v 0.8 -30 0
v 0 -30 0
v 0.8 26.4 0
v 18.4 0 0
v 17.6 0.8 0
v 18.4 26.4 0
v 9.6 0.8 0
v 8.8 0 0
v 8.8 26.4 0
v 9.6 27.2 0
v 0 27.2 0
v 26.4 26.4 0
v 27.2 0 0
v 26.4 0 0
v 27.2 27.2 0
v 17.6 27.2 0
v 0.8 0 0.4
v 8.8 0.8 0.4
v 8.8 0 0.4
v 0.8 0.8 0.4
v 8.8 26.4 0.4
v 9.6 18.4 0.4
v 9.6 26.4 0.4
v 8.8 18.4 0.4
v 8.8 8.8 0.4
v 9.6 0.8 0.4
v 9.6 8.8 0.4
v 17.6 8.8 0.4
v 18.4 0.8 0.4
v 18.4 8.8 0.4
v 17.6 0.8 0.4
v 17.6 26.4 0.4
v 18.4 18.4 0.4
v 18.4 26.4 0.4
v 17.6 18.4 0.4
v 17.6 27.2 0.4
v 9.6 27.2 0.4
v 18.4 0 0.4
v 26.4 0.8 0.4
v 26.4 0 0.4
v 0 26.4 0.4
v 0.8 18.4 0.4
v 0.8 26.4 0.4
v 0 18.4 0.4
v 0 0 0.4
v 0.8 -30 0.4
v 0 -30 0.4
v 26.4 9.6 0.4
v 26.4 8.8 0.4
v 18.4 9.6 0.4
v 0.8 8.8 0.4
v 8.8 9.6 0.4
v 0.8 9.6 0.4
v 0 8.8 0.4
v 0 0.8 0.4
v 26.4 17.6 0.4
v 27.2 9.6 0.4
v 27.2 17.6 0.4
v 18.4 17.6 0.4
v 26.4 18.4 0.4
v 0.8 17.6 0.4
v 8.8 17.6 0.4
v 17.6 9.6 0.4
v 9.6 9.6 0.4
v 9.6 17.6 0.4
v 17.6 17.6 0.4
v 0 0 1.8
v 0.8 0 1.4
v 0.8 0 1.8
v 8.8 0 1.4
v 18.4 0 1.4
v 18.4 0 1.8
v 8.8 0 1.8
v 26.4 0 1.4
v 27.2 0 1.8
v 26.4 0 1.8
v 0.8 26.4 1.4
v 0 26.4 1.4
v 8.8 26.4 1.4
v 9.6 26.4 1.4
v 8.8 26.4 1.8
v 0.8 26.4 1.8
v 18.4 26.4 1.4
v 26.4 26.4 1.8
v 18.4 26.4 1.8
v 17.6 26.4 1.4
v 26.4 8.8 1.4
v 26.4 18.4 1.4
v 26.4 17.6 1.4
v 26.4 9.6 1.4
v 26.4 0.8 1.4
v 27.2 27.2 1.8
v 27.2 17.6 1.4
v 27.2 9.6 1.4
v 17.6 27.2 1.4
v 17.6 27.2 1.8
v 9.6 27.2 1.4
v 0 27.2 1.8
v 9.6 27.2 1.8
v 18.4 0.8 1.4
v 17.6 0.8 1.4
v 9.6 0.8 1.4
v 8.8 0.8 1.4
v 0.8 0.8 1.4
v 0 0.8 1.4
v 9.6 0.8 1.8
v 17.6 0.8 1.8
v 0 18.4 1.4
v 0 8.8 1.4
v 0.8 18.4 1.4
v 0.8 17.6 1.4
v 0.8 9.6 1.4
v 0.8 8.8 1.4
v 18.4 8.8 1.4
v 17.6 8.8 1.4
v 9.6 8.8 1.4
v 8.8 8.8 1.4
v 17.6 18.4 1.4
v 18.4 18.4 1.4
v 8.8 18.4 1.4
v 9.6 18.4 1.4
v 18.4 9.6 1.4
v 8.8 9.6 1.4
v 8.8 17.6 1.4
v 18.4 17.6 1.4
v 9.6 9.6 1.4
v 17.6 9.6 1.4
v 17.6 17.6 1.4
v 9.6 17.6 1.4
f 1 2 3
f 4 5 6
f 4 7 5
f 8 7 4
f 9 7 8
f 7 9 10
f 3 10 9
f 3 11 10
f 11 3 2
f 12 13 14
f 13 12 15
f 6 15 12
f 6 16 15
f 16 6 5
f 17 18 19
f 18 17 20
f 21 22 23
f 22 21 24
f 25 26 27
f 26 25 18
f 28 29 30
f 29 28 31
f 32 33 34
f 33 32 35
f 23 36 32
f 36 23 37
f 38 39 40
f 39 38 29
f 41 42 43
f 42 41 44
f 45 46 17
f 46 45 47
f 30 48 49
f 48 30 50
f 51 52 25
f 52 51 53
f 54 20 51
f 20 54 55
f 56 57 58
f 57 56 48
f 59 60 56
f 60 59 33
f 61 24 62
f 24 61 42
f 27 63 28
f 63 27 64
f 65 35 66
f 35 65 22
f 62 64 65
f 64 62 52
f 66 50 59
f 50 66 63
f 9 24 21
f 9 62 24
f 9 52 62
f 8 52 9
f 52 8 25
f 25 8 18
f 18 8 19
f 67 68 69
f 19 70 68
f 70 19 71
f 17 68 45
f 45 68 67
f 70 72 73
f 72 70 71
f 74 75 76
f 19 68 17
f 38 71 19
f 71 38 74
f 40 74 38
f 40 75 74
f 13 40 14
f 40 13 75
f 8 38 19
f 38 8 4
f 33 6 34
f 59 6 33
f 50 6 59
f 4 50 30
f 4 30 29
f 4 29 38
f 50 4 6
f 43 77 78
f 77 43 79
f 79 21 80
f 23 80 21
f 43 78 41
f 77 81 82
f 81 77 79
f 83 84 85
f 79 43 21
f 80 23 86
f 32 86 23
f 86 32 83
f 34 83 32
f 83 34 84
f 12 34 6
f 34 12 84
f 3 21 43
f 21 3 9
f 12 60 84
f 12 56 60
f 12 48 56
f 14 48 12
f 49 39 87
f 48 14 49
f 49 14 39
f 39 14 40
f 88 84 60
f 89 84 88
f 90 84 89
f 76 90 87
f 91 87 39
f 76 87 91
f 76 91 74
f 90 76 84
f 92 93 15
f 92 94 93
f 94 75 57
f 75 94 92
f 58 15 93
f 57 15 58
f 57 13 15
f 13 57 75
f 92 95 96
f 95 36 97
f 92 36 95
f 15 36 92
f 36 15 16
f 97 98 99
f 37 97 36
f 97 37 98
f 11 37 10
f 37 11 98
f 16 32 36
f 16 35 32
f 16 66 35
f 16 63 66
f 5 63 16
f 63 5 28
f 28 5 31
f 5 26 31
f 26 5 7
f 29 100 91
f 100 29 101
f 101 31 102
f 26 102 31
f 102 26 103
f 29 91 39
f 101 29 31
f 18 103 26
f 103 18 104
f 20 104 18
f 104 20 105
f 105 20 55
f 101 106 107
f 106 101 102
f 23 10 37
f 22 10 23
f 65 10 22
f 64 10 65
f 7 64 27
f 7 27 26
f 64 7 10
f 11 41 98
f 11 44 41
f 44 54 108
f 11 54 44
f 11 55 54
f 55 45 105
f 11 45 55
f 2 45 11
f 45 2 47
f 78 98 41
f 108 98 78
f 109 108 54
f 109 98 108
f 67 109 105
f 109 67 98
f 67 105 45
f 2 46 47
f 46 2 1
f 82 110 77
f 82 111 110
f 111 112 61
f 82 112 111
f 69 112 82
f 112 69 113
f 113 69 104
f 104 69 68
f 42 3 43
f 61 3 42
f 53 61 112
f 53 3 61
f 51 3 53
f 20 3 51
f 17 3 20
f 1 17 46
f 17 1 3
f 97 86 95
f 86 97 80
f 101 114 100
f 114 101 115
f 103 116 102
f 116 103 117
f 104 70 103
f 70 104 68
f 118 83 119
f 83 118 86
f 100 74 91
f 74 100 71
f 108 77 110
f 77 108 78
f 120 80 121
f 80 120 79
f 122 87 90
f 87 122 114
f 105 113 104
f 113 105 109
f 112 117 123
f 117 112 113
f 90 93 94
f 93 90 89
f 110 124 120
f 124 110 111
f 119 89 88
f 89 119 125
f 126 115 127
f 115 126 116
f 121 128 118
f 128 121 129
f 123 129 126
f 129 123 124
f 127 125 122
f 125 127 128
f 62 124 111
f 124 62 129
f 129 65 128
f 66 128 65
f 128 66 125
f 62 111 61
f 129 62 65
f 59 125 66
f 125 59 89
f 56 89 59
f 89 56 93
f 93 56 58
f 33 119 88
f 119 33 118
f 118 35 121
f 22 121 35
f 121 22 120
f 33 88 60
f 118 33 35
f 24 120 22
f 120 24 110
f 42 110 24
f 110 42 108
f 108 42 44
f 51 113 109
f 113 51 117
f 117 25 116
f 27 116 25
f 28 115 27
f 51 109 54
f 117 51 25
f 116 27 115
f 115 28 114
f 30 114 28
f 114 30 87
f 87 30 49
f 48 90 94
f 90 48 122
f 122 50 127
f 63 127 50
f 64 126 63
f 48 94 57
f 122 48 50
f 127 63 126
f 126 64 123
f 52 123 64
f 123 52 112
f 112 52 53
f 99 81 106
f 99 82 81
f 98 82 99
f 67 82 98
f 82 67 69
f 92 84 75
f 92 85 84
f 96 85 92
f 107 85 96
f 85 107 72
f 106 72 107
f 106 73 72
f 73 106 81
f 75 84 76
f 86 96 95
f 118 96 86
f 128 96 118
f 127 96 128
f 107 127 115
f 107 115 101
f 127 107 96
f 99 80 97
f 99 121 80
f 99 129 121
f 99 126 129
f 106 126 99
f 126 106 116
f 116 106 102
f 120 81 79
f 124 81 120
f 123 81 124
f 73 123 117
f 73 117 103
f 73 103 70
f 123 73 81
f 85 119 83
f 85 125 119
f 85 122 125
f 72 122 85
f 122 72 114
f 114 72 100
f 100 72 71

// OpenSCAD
// file: ../../api/v3/reporting.scad
//////////////////////////////////////////////////////////////////////
// LibFile: reporting.scad
// Project: Grid Stack
// FileGroup: API v3 Reporting
// FileSummary: Console report for immutable direct and positive-gap coupons.
// Role: Records the exact environment, dimensions, support strategy, path
//       lengths, qualification status, and deposited-layer counts.
// Requires: API v3 indexes, mathematics, and path generator.
// Exports: report_structural_coupon_object().
//////////////////////////////////////////////////////////////////////

function _bridge_status3(span, process) =
    span <= process[PX3_BRIDGE_MAX]
        ? "within_owner_tested_limit"
        : "exploratory_beyond_owner_tested_limit";

module report_structural_coupon_object(object, report_level = "full") {
    material = object[SCO_MATERIAL];
    nozzle = object[SCO_NOZZLE];
    printer = object[SCO_PRINTER];
    process = object[SCO_PROCESS];
    boundary = object[SCO_BOUNDARY];
    gap = object[SCO_CLEAR_GAP];
    strategy = object[SCO_SUPPORT_STRATEGY];

    echo("--- Grid Stack immutable structural coupon ---");
    echo(str("Object: ", object[SCO_NAME], " revision ", object[SCO_REVISION]));
    echo(str("API/schema: ", object[SCO_REQUIRED_API], "/",
        object[SCO_SCHEMA_VERSION]));
    echo(str("Release/base commit: ", object[SCO_SOURCE_RELEASE], " / ",
        object[SCO_FRAMEWORK_BASE_COMMIT]));
    echo(str("Material/nozzle/printer: ", material[MAT3_FAMILY], " / ",
        nozzle[NZ3_DIAMETER], " mm / ", printer[PRN3_NAME]));
    echo(str("Cells: ", boundary[B3_CELLS_X], " x ", boundary[B3_CELLS_Y]));
    echo(str("Clear spans: ", boundary[B3_CLEAR_SPAN_X], " x ",
        boundary[B3_CLEAR_SPAN_Y], " mm"));
    echo(str("Span status: ",
        _bridge_status3(boundary[B3_CLEAR_SPAN_X], process)));
    echo(str("Outside size: ", boundary_size_x3(boundary, process, nozzle),
        " x ", boundary_size_y3(boundary, process, nozzle), " mm"));
    echo(str("Primitive trace: ", trace_width3(nozzle), " x ",
        trace_height3(process), " mm"));
    echo(str("Structural strand: ", strand_width3(process, nozzle), " x ",
        strand_height3(process), " mm"));
    echo(str("Clear vertical gap: ", gap, " mm"));
    echo(str("Support strategy: ", strategy));
    echo(str("Total modeled height: ", coupon_total_height3(object), " mm"));

    if (report_level == "full") {
        if (strategy == "direct_orthogonal") {
            lower = coupon_path(
                boundary, process, nozzle, 0, object[SCO_LEAD_IN]
            );
            upper = coupon_path(boundary, process, nozzle, 90, 0);
            echo(str("Lower/upper path lengths: ", path_length3(lower),
                " / ", path_length3(upper), " mm"));
            echo(str("Deposited layers: ", 2 * process[PX3_HEIGHT_PASSES]));
        }
        else {
            witness = coupon_path(
                boundary, process, nozzle, 90, object[SCO_LEAD_IN]
            );
            riser = coupon_path(boundary, process, nozzle, 0, 0);
            test = coupon_path(boundary, process, nozzle, 90, 0);
            echo(str("Witness/riser/test path lengths: ",
                path_length3(witness), " / ", path_length3(riser), " / ",
                path_length3(test), " mm"));
            echo(str("Riser deposited layers: ", round(gap_layer_count3(object))));
            echo(str("Total deposited layers: ",
                2 * process[PX3_HEIGHT_PASSES] +
                round(gap_layer_count3(object))));
        }
        echo(str("Status: ", object[SCO_STATUS]));
        echo(str("Notes: ", object[SCO_NOTES]));
    }
}
// file: ../../api/v3/validation.scad
//////////////////////////////////////////////////////////////////////
// LibFile: validation.scad
// Project: Grid Stack
// FileGroup: API v3 Validation
// FileSummary: Validates immutable environment records, count boundaries,
//              support strategy, path continuity, and layer quantization.
// Role: Rejects incompatible or physically floating recipes before geometry
//       is generated.
// Requires: API v3 indexes, mathematics, and path generator.
// Exports: validate_structural_coupon_object().
//////////////////////////////////////////////////////////////////////

module _validate_path3(points, boundary, orientation, lead_in) {
    run_count = orientation == 0
        ? boundary_strand_count_y3(boundary)
        : boundary_strand_count_x3(boundary);

    assert(len(points) == expected_coupon_point_count3(run_count, lead_in),
        "API v3 coupon path has an unexpected point count.");
    assert(!path_has_zero_segment3(points),
        "API v3 coupon path contains a zero-length segment.");
    assert(path_axis_aligned3(points),
        "API v3 coupon path must remain axis-aligned.");
    assert(points[0] != points[len(points) - 1],
        "API v3 coupon path must remain open.");
}

module validate_structural_coupon_object(object) {
    assert(object[SCO_REQUIRED_API] == GRID_STACK_API_VERSION,
        "Saved coupon requires a different Grid Stack API version.");
    assert(object[SCO_SCHEMA_VERSION] == GRID_STACK_COUPON_SCHEMA_VERSION,
        "Saved coupon requires a different coupon schema version.");
    assert(GRID_STACK_RECTANGULAR_FRAMEWORK_VERSION == 2,
        "Saved coupon requires rectangular framework version 2.");

    material = object[SCO_MATERIAL];
    nozzle = object[SCO_NOZZLE];
    printer = object[SCO_PRINTER];
    process = object[SCO_PROCESS];
    boundary = object[SCO_BOUNDARY];
    gap = object[SCO_CLEAR_GAP];
    lead_in = object[SCO_LEAD_IN];
    strategy = object[SCO_SUPPORT_STRATEGY];

    assert(nozzle[NZ3_DIAMETER] > 0,
        "Saved coupon nozzle diameter must be positive.");
    assert(process[PX3_LAYER_H] > 0,
        "Saved coupon layer height must be positive.");
    assert(process[PX3_WIDTH_PASSES] >= 2,
        "Saved coupon structural width requires at least two passes.");
    assert(process[PX3_HEIGHT_PASSES] >= 2,
        "Saved coupon structural height requires at least two layers.");
    assert(process[PX3_MATERIAL] == material[MAT3_NAME],
        "Saved coupon process/material references do not match.");
    assert(process[PX3_NOZZLE] == nozzle[NZ3_NAME],
        "Saved coupon process/nozzle references do not match.");
    assert(process[PX3_PRINTER] == printer[PRN3_NAME],
        "Saved coupon process/printer references do not match.");
    assert(boundary[B3_CELLS_X] > 0 && boundary[B3_CELLS_Y] > 0,
        "Saved coupon cell counts must be positive.");
    assert(boundary[B3_CLEAR_SPAN_X] > 0 &&
           boundary[B3_CLEAR_SPAN_Y] > 0,
        "Saved coupon clear spans must be positive.");
    assert(lead_in >= 0,
        "Saved coupon lead-in cannot be negative.");
    assert(gap >= 0,
        "Saved coupon clear gap cannot be negative.");
    assert(nearly_equal3(gap_layer_count3(object), round(gap_layer_count3(object))),
        "Saved coupon clear gap must equal a whole deposited-layer count.");
    assert(
        (strategy == "direct_orthogonal" && nearly_equal3(gap, 0)) ||
        (strategy == "witness_riser_bridge" && gap > 0),
        "Saved coupon support strategy does not match its clear gap."
    );

    if (strategy == "direct_orthogonal") {
        lower = coupon_path(boundary, process, nozzle, 0, lead_in);
        upper = coupon_path(boundary, process, nozzle, 90, 0);
        _validate_path3(lower, boundary, 0, lead_in);
        _validate_path3(upper, boundary, 90, 0);
        entry = lead_in > 0 ? 1 : 0;
        assert(nearly_equal3(point_distance_2d3(lower[entry], upper[0]), 0),
            "Direct upper path must start on the lower entry crossing.");
    }
    else {
        witness = coupon_path(boundary, process, nozzle, 90, lead_in);
        riser = coupon_path(boundary, process, nozzle, 0, 0);
        test = coupon_path(boundary, process, nozzle, 90, 0);
        _validate_path3(witness, boundary, 90, lead_in);
        _validate_path3(riser, boundary, 0, 0);
        _validate_path3(test, boundary, 90, 0);
        entry = lead_in > 0 ? 1 : 0;
        assert(nearly_equal3(point_distance_2d3(witness[entry], riser[0]), 0),
            "Riser path must start on the witness entry crossing.");
        assert(nearly_equal3(point_distance_2d3(riser[0], test[0]), 0),
            "Upper test path must start on the riser entry crossing.");
        for (i = [0 : len(test) - 1])
            assert(nearly_equal3(point_distance_2d3(test[i], witness[i + entry]), 0),
                "Upper test path must align directly above the witness path.");
    }

    echo("GRID STACK API V3 COUPON VALIDATION: PASS");
}
// file: ../../api/v3/geometry.scad
//////////////////////////////////////////////////////////////////////
// LibFile: geometry.scad
// Project: Grid Stack
// FileGroup: API v3 Printable Geometry
// FileSummary: Creates square-ended structural paths, direct-contact coupons,
//              positive witness/riser/bridge coupons, and simple diagnostics.
// Role: Supplies all geometry used by immutable API v3 recipes without
//       importing mutable workbench geometry.
// Requires: API v3 mathematics and ordered axis-aligned paths.
// Exports: render_direct_coupon(), render_positive_gap_coupon(), and
//          render_coupon_path_debug().
//////////////////////////////////////////////////////////////////////

module _segment_2d3(a, b, width) {
    horizontal = nearly_equal3(a[1], b[1]);
    vertical = nearly_equal3(a[0], b[0]);

    assert(horizontal || vertical,
        "API v3 printable segments must be horizontal or vertical.");
    assert(!nearly_equal3(point_distance_2d3(a, b), 0),
        "API v3 printable segments must have nonzero length.");

    if (horizontal)
        translate([min(a[0], b[0]) - width / 2, a[1] - width / 2])
            square([abs(b[0] - a[0]) + width, width]);
    else
        translate([a[0] - width / 2, min(a[1], b[1]) - width / 2])
            square([width, abs(b[1] - a[1]) + width]);
}

module _path_2d3(points, width) {
    union()
        for (i = [0 : len(points) - 2])
            _segment_2d3(points[i], points[i + 1], width);
}

module _structural_path3(points, process, nozzle) {
    linear_extrude(height = strand_height3(process), convexity = 10)
        _path_2d3(points, strand_width3(process, nozzle));
}

module render_direct_coupon(lower, upper, process, nozzle) {
    union() {
        _structural_path3(lower, process, nozzle);
        translate([0, 0, strand_height3(process)])
            _structural_path3(upper, process, nozzle);
    }
}

module render_positive_gap_coupon(
    witness, riser, test, process, nozzle, clear_gap
) {
    union() {
        _structural_path3(witness, process, nozzle);

        translate([0, 0, strand_height3(process)])
            linear_extrude(height = clear_gap, convexity = 10)
                _path_2d3(riser, strand_width3(process, nozzle));

        translate([0, 0, strand_height3(process) + clear_gap])
            _structural_path3(test, process, nozzle);
    }
}

module _debug_path3(points, z, width) {
    translate([0, 0, z])
        linear_extrude(height = 0.04)
            _path_2d3(points, width);
}

module render_coupon_path_debug(
    lower, upper, riser, process, clear_gap = 0
) {
    width = max(0.12, trace_height3(process));
    _debug_path3(lower, 0, width);
    if (len(riser) > 0)
        _debug_path3(riser, strand_height3(process), width);
    _debug_path3(
        upper,
        strand_height3(process) + clear_gap,
        width
    );
}
// file: ../../api/v3/paths.scad
//////////////////////////////////////////////////////////////////////
// LibFile: paths.scad
// Project: Grid Stack
// FileGroup: API v3 Path Generation
// FileSummary: Generates one open rectangular serpentine centerline from a
//              count boundary for X- or Y-running structural paths.
// Role: Preserves parallel runs, square connectors, optional single lead-in,
//       and one uninterrupted ordered point list per deposited layer.
// Requires: API v3 indexes and mathematics.
// Exports: coupon_path() and expected_coupon_point_count3().
//////////////////////////////////////////////////////////////////////

function _x_rows3(row, count, x_min, x_max, y_min, pitch) =
    row >= count
        ? []
        : let(
            y = y_min + row * pitch,
            x_end = row % 2 == 0 ? x_max : x_min,
            row_end = [x_end, y],
            connector_end = [x_end, y + pitch]
        )
        concat(
            [row_end],
            row < count - 1 ? [connector_end] : [],
            _x_rows3(row + 1, count, x_min, x_max, y_min, pitch)
        );

function _y_columns3(column, count, x_min, y_min, y_max, pitch) =
    column >= count
        ? []
        : let(
            x = x_min + column * pitch,
            y_end = column % 2 == 0 ? y_max : y_min,
            column_end = [x, y_end],
            connector_end = [x + pitch, y_end]
        )
        concat(
            [column_end],
            column < count - 1 ? [connector_end] : [],
            _y_columns3(column + 1, count, x_min, y_min, y_max, pitch)
        );

function expected_coupon_point_count3(run_count, lead_in = 0) =
    2 * run_count + (lead_in > 0 ? 1 : 0);

function coupon_path(
    boundary, process, nozzle, orientation = 0, lead_in = 0
) =
    assert(orientation == 0 || orientation == 90,
        "API v3 coupon orientation must be 0 or 90 degrees.")
    assert(lead_in >= 0,
        "API v3 coupon lead-in cannot be negative.")
    let(
        width = strand_width3(process, nozzle),
        x_min = width / 2,
        y_min = width / 2,
        x_max = boundary_size_x3(boundary, process, nozzle) - width / 2,
        y_max = boundary_size_y3(boundary, process, nozzle) - width / 2,
        entry = [x_min, y_min],
        prefix = lead_in > 0
            ? (orientation == 0
                ? [[x_min - lead_in, y_min], entry]
                : [[x_min, y_min - lead_in], entry])
            : [entry]
    )
    orientation == 0
        ? concat(
            prefix,
            _x_rows3(
                0, boundary_strand_count_y3(boundary),
                x_min, x_max, y_min,
                boundary_pitch_y3(boundary, process, nozzle)
            )
        )
        : concat(
            prefix,
            _y_columns3(
                0, boundary_strand_count_x3(boundary),
                x_min, y_min, y_max,
                boundary_pitch_x3(boundary, process, nozzle)
            )
        );
// file: ../../api/v3/math.scad
//////////////////////////////////////////////////////////////////////
// LibFile: math.scad
// Project: Grid Stack
// FileGroup: API v3 Mathematics
// FileSummary: Pure trace, strand, boundary, path, and layer-count helpers.
// Role: Keeps API v3 calculations isolated and reproducible without importing
//       mutable workbench mathematics.
// Requires: API v3 indexes.
// Exports: nearly_equal3(), trace/strand dimensions, boundary dimensions,
//          path inspection, gap-layer count, and total-height helpers.
//////////////////////////////////////////////////////////////////////

function nearly_equal3(a, b, epsilon = 0.000001) = abs(a - b) <= epsilon;

function trace_width3(nozzle) = nozzle[NZ3_DIAMETER];
function trace_height3(process) = process[PX3_LAYER_H];
function strand_width3(process, nozzle) =
    trace_width3(nozzle) * process[PX3_WIDTH_PASSES];
function strand_height3(process) =
    trace_height3(process) * process[PX3_HEIGHT_PASSES];

function boundary_strand_count_x3(boundary) = boundary[B3_CELLS_X] + 1;
function boundary_strand_count_y3(boundary) = boundary[B3_CELLS_Y] + 1;
function boundary_pitch_x3(boundary, process, nozzle) =
    boundary[B3_CLEAR_SPAN_X] + strand_width3(process, nozzle);
function boundary_pitch_y3(boundary, process, nozzle) =
    boundary[B3_CLEAR_SPAN_Y] + strand_width3(process, nozzle);
function boundary_size_x3(boundary, process, nozzle) =
    boundary[B3_CELLS_X] * boundary[B3_CLEAR_SPAN_X] +
    boundary_strand_count_x3(boundary) * strand_width3(process, nozzle);
function boundary_size_y3(boundary, process, nozzle) =
    boundary[B3_CELLS_Y] * boundary[B3_CLEAR_SPAN_Y] +
    boundary_strand_count_y3(boundary) * strand_width3(process, nozzle);

function point_distance_2d3(a, b) =
    sqrt(pow(b[0] - a[0], 2) + pow(b[1] - a[1], 2));
function path_length3(points, i = 0) =
    i >= len(points) - 1
        ? 0
        : point_distance_2d3(points[i], points[i + 1]) +
          path_length3(points, i + 1);
function path_has_zero_segment3(points, i = 0) =
    i >= len(points) - 1
        ? false
        : nearly_equal3(point_distance_2d3(points[i], points[i + 1]), 0)
            ? true
            : path_has_zero_segment3(points, i + 1);
function segment_axis_aligned3(a, b) =
    nearly_equal3(a[0], b[0]) || nearly_equal3(a[1], b[1]);
function path_axis_aligned3(points, i = 0) =
    i >= len(points) - 1
        ? true
        : segment_axis_aligned3(points[i], points[i + 1]) &&
          path_axis_aligned3(points, i + 1);

function gap_layer_count3(object) =
    object[SCO_CLEAR_GAP] / trace_height3(object[SCO_PROCESS]);
function coupon_total_height3(object) =
    2 * strand_height3(object[SCO_PROCESS]) + object[SCO_CLEAR_GAP];
// file: ../../api/v3/schema.scad
//////////////////////////////////////////////////////////////////////
// LibFile: schema.scad
// Project: Grid Stack
// FileGroup: API v3 Data Model
// FileSummary: Constructors for self-contained immutable structural coupons.
// Role: Makes every geometry-affecting environment and object value explicit
//       inside the saved recipe rather than resolving mutable catalog names.
// Exports: material_spec(), nozzle_spec(), printer_spec(),
//          structural_process_profile(), count_boundary(), and
//          structural_coupon_object().
//////////////////////////////////////////////////////////////////////

function material_spec(
    name, family, flexibility, status = "in_use", notes = ""
) = [name, family, flexibility, status, notes];

function nozzle_spec(
    name, diameter, construction = "brass", status = "in_use", notes = ""
) = [name, diameter, construction, status, notes];

function printer_spec(
    name,
    manufacturer = "",
    model = "",
    motion_system = "",
    build_surface = "",
    status = "unrecorded",
    notes = ""
) = [
    name, manufacturer, model, motion_system,
    build_surface, status, notes
];

function structural_process_profile(
    name,
    material_name,
    nozzle_name,
    printer_name,
    layer_height,
    width_passes,
    height_passes,
    bridge_max,
    qualification,
    revision,
    notes = ""
) = [
    name, material_name, nozzle_name, printer_name,
    layer_height, width_passes, height_passes, bridge_max,
    qualification, revision, notes
];

// Function: count_boundary()
// Synopsis: Stores clear-opening counts and clear spans for one rectangle.
function count_boundary(
    name,
    cells_x,
    cells_y,
    clear_span_x,
    clear_span_y,
    notes = ""
) = [name, cells_x, cells_y, clear_span_x, clear_span_y, notes];

// Function: structural_coupon_object()
// Synopsis: Constructs one permanent coupon recipe.
// Description:
//   framework_base_commit records the last accepted repository state used to
//   begin the API implementation. The Git commit containing this recipe is the
//   authoritative complete source; a file cannot embed its own future hash.
function structural_coupon_object(
    name,
    revision,
    required_api_version,
    coupon_schema_version,
    source_release,
    framework_base_commit,
    material,
    nozzle,
    printer,
    process,
    boundary,
    clear_vertical_gap,
    lead_in,
    support_strategy,
    status = "calibration",
    notes = ""
) = [
    name,
    revision,
    required_api_version,
    coupon_schema_version,
    source_release,
    framework_base_commit,
    material,
    nozzle,
    printer,
    process,
    boundary,
    clear_vertical_gap,
    lead_in,
    support_strategy,
    status,
    notes
];
// file: ../../api/v3/indices.scad
//////////////////////////////////////////////////////////////////////
// LibFile: indices.scad
// Project: Grid Stack
// FileGroup: API v3 Data Model
// FileSummary: Named indexes for immutable structural-coupon records.
// Role: Prevents unexplained numeric indexes from entering saved recipes and
//       keeps API version 3 independent of mutable workbench indexes.
// Exports: MAT3_*, NZ3_*, PRN3_*, PX3_*, B3_*, and SCO_* constants.
//////////////////////////////////////////////////////////////////////

MAT3_NAME = 0;
MAT3_FAMILY = 1;
MAT3_FLEXIBILITY = 2;
MAT3_STATUS = 3;
MAT3_NOTES = 4;

NZ3_NAME = 0;
NZ3_DIAMETER = 1;
NZ3_CONSTRUCTION = 2;
NZ3_STATUS = 3;
NZ3_NOTES = 4;

PRN3_NAME = 0;
PRN3_MANUFACTURER = 1;
PRN3_MODEL = 2;
PRN3_MOTION_SYSTEM = 3;
PRN3_BUILD_SURFACE = 4;
PRN3_STATUS = 5;
PRN3_NOTES = 6;

PX3_NAME = 0;
PX3_MATERIAL = 1;
PX3_NOZZLE = 2;
PX3_PRINTER = 3;
PX3_LAYER_H = 4;
PX3_WIDTH_PASSES = 5;
PX3_HEIGHT_PASSES = 6;
PX3_BRIDGE_MAX = 7;
PX3_QUALIFICATION = 8;
PX3_REVISION = 9;
PX3_NOTES = 10;

B3_NAME = 0;
B3_CELLS_X = 1;
B3_CELLS_Y = 2;
B3_CLEAR_SPAN_X = 3;
B3_CLEAR_SPAN_Y = 4;
B3_NOTES = 5;

SCO_NAME = 0;
SCO_REVISION = 1;
SCO_REQUIRED_API = 2;
SCO_SCHEMA_VERSION = 3;
SCO_SOURCE_RELEASE = 4;
SCO_FRAMEWORK_BASE_COMMIT = 5;
SCO_MATERIAL = 6;
SCO_NOZZLE = 7;
SCO_PRINTER = 8;
SCO_PROCESS = 9;
SCO_BOUNDARY = 10;
SCO_CLEAR_GAP = 11;
SCO_LEAD_IN = 12;
SCO_SUPPORT_STRATEGY = 13;
SCO_STATUS = 14;
SCO_NOTES = 15;
// file: ../../api/grid_stack_v3.scad
//////////////////////////////////////////////////////////////////////
// LibFile: grid_stack_v3.scad
// Project: Grid Stack
// FileGroup: Versioned Public Interface
// FileSummary: Immutable API version 3 for rectangular count-boundary
//              structural coupons, including positive witness/riser gaps.
// Role: Reconstructs saved coupon recipes without Customizer state or mutable
//       workbench catalogs. Incompatible behavior requires a new API file.
// Exports: API/schema constants, record constructors, validation, reporting,
//          and structural_coupon_render().
//////////////////////////////////////////////////////////////////////

GRID_STACK_API_VERSION = 3;
GRID_STACK_COUPON_SCHEMA_VERSION = 1;
GRID_STACK_RECTANGULAR_FRAMEWORK_VERSION = 2;
GRID_STACK_RELEASE = "1.0.0";

include <v3/indices.scad>
include <v3/schema.scad>
include <v3/math.scad>
include <v3/paths.scad>
include <v3/geometry.scad>
include <v3/validation.scad>
include <v3/reporting.scad>

// Module: structural_coupon_render()
// Synopsis: Validates, reports, and renders one immutable coupon recipe.
// Arguments:
//   object = Record returned by structural_coupon_object().
//   mode = print, path_debug, or report_only.
//   report_level = summary or full.
module structural_coupon_render(
    object,
    mode = "print",
    report_level = "full"
) {
    validate_structural_coupon_object(object);
    report_structural_coupon_object(object, report_level);

    boundary = object[SCO_BOUNDARY];
    process = object[SCO_PROCESS];
    nozzle = object[SCO_NOZZLE];
    lead_in = object[SCO_LEAD_IN];
    clear_gap = object[SCO_CLEAR_GAP];
    strategy = object[SCO_SUPPORT_STRATEGY];

    if (strategy == "direct_orthogonal") {
        lower = coupon_path(boundary, process, nozzle, 0, lead_in);
        upper = coupon_path(boundary, process, nozzle, 90, 0);

        if (mode == "print")
            render_direct_coupon(lower, upper, process, nozzle);
        else if (mode == "path_debug")
            render_coupon_path_debug(lower, upper, [], process);
        else if (mode == "report_only")
            echo("Grid Stack API v3 report-only mode: no geometry generated.");
        else
            assert(false, str("Unknown API v3 render mode: ", mode));
    }
    else if (strategy == "witness_riser_bridge") {
        witness = coupon_path(boundary, process, nozzle, 90, lead_in);
        riser = coupon_path(boundary, process, nozzle, 0, 0);
        test = coupon_path(boundary, process, nozzle, 90, 0);

        if (mode == "print")
            render_positive_gap_coupon(
                witness, riser, test, process, nozzle, clear_gap
            );
        else if (mode == "path_debug")
            render_coupon_path_debug(witness, test, riser, process, clear_gap);
        else if (mode == "report_only")
            echo("Grid Stack API v3 report-only mode: no geometry generated.");
        else
            assert(false, str("Unknown API v3 render mode: ", mode));
    }
    else
        assert(false, str("Unknown coupon support strategy: ", strategy));
}
// main file
//////////////////////////////////////////////////////////////////////
// LibFile: coupon-3x3-span8-gap1-pla-plus-0p4-v1.scad
// Project: Grid Stack
// FileGroup: Immutable Structural Coupon
// FileSummary: 3 x 3 PLA+ coupon with 8 mm clear XY spans and 1 mm
//              clear vertical gap using witness_riser_bridge geometry.
// Role: Permanently reconstructs one calibration object without Customizer
//       state or mutable workbench catalog lookup.
// FrameworkBaseCommit: 4b5e564
// Requires: Grid Stack API version 3 and coupon schema version 1.
// Output: Printable continuous-path structural coupon geometry.
//////////////////////////////////////////////////////////////////////

include <../../api/grid_stack_v3.scad>

assert(GRID_STACK_API_VERSION == 3,
    "This recipe requires Grid Stack API version 3.");
assert(GRID_STACK_COUPON_SCHEMA_VERSION == 1,
    "This recipe requires coupon schema version 1.");
assert(GRID_STACK_RECTANGULAR_FRAMEWORK_VERSION == 2,
    "This recipe requires rectangular framework version 2.");

saved_material = material_spec(
    name = "PLA_PLUS",
    family = "PLA+",
    flexibility = "rigid",
    status = "in_use",
    notes = "Exact material family selected for the coupon matrix."
);

saved_nozzle = nozzle_spec(
    name = "BRASS_0P4",
    diameter = 0.4,
    construction = "brass",
    status = "in_use",
    notes = "Nominal nozzle diameter used to derive the 0.8 mm strand width."
);

saved_printer = printer_spec(
    name = "UNRECORDED_PRINTER_R1",
    manufacturer = "",
    model = "",
    motion_system = "",
    build_surface = "",
    status = "unrecorded",
    notes = "Printer identity was not frozen with this coupon framework."
);

saved_process = structural_process_profile(
    name = "PLA_PLUS_0P4_LH0P2_W2_H2_R1",
    material_name = "PLA_PLUS",
    nozzle_name = "BRASS_0P4",
    printer_name = "UNRECORDED_PRINTER_R1",
    layer_height = 0.2,
    width_passes = 2,
    height_passes = 2,
    bridge_max = 6,
    qualification = "owner_tested_to_6mm",
    revision = 1,
    notes = "Primitive trace 0.4 x 0.2 mm; structural strand 0.8 x 0.4 mm."
);

saved_boundary = count_boundary(
    name = "COUNT_3X3_SPAN8",
    cells_x = 3,
    cells_y = 3,
    clear_span_x = 8,
    clear_span_y = 8,
    notes = "Outside dimensions derive from four strands and three clear openings."
);

saved_coupon = structural_coupon_object(
    name = "COUPON_3X3_SPAN8_GAP1_PLA_PLUS_0P4_V1",
    revision = 1,
    required_api_version = 3,
    coupon_schema_version = 1,
    source_release = "1.0.0",
    framework_base_commit = "4b5e564",
    material = saved_material,
    nozzle = saved_nozzle,
    printer = saved_printer,
    process = saved_process,
    boundary = saved_boundary,
    clear_vertical_gap = 1,
    lead_in = 30,
    support_strategy = "witness_riser_bridge",
    status = "calibration_unprinted",
    notes = "Calibration recipe generated from the frozen Batch 010 framework; record results in a new revision after printing."
);

structural_coupon_render(
    saved_coupon,
    mode = "print",
    report_level = "full"
);
